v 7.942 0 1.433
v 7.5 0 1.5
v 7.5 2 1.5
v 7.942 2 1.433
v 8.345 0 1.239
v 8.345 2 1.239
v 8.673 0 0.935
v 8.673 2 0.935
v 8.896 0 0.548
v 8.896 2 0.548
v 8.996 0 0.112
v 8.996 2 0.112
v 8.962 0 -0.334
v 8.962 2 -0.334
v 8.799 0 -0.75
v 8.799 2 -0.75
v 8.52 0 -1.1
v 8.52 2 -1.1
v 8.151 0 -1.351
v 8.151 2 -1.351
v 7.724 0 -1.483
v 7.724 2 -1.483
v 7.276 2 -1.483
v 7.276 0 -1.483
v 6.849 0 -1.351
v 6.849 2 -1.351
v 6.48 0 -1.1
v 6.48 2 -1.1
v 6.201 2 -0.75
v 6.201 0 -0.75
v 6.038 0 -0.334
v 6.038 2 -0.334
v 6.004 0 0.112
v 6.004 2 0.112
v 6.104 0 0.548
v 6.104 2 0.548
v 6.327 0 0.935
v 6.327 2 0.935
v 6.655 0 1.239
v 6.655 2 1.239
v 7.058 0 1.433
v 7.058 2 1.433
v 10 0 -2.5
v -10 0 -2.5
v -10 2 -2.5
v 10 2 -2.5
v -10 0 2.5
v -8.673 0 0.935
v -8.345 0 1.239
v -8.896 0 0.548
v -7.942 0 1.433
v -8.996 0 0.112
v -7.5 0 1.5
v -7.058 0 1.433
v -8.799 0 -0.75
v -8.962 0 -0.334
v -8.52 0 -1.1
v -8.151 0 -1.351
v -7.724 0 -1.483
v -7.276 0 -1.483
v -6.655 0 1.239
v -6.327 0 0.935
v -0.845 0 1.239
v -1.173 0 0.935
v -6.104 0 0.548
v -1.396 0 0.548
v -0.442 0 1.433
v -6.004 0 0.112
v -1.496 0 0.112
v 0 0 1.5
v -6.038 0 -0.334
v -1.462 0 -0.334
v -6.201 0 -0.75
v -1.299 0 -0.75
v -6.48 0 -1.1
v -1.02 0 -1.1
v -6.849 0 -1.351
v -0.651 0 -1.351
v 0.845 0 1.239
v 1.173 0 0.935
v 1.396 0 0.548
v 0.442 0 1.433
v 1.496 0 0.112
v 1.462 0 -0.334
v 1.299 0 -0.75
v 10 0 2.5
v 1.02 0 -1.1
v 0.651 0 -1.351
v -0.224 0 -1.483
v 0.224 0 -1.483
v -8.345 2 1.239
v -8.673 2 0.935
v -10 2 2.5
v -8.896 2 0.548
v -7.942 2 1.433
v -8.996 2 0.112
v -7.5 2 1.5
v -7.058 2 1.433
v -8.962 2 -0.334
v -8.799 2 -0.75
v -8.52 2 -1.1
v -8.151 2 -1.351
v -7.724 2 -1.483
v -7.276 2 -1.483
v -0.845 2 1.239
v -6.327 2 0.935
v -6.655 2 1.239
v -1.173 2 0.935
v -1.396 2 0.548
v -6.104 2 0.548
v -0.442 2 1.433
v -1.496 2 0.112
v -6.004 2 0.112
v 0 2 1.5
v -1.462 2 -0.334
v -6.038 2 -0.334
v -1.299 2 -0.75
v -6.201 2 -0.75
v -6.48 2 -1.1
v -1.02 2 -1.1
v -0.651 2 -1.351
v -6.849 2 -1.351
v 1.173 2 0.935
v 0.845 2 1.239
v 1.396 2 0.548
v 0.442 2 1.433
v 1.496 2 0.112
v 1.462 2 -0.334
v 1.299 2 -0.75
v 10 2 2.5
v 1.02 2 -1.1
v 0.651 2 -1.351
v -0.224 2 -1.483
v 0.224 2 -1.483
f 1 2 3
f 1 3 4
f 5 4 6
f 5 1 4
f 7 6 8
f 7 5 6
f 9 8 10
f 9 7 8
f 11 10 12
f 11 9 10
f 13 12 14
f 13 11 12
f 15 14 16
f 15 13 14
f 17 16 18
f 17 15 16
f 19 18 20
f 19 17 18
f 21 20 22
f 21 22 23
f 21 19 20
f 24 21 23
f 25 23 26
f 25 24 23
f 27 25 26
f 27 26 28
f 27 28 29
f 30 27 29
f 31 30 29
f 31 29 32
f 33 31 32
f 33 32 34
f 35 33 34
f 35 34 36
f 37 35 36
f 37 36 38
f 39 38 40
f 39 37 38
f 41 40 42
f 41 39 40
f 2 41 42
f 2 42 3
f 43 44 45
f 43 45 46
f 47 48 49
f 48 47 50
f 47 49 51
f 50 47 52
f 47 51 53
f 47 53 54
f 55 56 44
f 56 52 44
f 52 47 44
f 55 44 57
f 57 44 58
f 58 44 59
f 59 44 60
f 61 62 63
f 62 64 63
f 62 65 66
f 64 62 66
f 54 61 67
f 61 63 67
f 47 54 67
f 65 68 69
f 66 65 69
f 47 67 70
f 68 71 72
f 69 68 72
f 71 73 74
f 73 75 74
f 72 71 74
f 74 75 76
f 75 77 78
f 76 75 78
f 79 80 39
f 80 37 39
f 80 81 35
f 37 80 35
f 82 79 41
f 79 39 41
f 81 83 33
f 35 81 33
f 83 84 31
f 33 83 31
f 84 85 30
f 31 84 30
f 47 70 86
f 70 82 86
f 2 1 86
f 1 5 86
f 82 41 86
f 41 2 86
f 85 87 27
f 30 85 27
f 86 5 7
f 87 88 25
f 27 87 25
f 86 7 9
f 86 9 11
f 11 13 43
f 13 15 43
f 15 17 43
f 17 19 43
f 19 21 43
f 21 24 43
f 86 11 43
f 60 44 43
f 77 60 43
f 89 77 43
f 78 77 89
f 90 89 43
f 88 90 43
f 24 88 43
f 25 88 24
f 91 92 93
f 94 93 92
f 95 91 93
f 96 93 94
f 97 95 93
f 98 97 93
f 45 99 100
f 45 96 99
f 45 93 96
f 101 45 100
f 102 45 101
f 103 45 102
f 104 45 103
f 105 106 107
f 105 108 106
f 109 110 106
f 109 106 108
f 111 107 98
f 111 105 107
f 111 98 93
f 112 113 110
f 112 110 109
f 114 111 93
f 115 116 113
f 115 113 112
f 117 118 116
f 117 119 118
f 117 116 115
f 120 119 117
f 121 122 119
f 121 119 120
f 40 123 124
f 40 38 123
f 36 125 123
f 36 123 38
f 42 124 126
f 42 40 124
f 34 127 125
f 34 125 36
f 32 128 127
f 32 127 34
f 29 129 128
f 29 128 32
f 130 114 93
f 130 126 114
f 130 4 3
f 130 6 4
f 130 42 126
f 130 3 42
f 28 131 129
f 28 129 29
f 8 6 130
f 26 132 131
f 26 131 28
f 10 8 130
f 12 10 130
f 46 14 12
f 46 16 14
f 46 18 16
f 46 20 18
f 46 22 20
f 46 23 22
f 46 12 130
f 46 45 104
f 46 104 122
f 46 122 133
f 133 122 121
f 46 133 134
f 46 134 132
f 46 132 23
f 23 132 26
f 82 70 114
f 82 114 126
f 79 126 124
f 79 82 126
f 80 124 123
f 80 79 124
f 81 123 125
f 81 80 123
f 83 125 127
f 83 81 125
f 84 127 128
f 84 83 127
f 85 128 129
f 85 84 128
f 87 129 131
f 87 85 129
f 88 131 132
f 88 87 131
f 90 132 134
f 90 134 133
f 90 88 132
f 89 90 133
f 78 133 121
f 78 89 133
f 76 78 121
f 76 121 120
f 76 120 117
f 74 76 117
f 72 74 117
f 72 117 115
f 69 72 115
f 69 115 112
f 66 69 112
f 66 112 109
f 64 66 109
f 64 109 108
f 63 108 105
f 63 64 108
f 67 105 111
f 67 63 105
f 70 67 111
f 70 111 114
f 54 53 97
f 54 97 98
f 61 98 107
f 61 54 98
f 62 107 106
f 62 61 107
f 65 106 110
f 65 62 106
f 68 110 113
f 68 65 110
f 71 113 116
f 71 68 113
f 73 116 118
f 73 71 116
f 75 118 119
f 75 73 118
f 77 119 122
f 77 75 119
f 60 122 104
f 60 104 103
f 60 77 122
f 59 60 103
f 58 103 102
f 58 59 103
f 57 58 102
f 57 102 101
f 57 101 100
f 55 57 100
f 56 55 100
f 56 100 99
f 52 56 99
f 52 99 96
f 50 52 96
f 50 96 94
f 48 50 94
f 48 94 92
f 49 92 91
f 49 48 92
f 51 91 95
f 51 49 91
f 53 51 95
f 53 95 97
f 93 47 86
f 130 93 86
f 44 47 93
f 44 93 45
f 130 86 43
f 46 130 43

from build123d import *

# Parameters (mm, degrees)
SKETCH1_W           = 20
SKETCH1_H           = 5
SKETCH1_R           = 1.5
BOSS_EXTRUDE1_DEPTH = 2


with BuildPart() as part:
    # Sketch1 → Boss-Extrude1 (new body)
    with BuildSketch(Plane(origin=(0, 0, 0), x_dir=(1, 0, 0), z_dir=(0, 1, 0))):
        Rectangle(SKETCH1_W, SKETCH1_H)
        with Locations(Location((-7.5, 0, 0), (0, 0, 270))):
            Circle(SKETCH1_R, mode=Mode.SUBTRACT)
        with Locations(Location((7.5, 0, 0), (0, 0, 270))):
            Circle(SKETCH1_R, mode=Mode.SUBTRACT)
        with Locations(Location((0, 0, 0), (0, 0, 270))):
            Circle(SKETCH1_R, mode=Mode.SUBTRACT)
    extrude(amount=BOSS_EXTRUDE1_DEPTH)


solid = part.part
